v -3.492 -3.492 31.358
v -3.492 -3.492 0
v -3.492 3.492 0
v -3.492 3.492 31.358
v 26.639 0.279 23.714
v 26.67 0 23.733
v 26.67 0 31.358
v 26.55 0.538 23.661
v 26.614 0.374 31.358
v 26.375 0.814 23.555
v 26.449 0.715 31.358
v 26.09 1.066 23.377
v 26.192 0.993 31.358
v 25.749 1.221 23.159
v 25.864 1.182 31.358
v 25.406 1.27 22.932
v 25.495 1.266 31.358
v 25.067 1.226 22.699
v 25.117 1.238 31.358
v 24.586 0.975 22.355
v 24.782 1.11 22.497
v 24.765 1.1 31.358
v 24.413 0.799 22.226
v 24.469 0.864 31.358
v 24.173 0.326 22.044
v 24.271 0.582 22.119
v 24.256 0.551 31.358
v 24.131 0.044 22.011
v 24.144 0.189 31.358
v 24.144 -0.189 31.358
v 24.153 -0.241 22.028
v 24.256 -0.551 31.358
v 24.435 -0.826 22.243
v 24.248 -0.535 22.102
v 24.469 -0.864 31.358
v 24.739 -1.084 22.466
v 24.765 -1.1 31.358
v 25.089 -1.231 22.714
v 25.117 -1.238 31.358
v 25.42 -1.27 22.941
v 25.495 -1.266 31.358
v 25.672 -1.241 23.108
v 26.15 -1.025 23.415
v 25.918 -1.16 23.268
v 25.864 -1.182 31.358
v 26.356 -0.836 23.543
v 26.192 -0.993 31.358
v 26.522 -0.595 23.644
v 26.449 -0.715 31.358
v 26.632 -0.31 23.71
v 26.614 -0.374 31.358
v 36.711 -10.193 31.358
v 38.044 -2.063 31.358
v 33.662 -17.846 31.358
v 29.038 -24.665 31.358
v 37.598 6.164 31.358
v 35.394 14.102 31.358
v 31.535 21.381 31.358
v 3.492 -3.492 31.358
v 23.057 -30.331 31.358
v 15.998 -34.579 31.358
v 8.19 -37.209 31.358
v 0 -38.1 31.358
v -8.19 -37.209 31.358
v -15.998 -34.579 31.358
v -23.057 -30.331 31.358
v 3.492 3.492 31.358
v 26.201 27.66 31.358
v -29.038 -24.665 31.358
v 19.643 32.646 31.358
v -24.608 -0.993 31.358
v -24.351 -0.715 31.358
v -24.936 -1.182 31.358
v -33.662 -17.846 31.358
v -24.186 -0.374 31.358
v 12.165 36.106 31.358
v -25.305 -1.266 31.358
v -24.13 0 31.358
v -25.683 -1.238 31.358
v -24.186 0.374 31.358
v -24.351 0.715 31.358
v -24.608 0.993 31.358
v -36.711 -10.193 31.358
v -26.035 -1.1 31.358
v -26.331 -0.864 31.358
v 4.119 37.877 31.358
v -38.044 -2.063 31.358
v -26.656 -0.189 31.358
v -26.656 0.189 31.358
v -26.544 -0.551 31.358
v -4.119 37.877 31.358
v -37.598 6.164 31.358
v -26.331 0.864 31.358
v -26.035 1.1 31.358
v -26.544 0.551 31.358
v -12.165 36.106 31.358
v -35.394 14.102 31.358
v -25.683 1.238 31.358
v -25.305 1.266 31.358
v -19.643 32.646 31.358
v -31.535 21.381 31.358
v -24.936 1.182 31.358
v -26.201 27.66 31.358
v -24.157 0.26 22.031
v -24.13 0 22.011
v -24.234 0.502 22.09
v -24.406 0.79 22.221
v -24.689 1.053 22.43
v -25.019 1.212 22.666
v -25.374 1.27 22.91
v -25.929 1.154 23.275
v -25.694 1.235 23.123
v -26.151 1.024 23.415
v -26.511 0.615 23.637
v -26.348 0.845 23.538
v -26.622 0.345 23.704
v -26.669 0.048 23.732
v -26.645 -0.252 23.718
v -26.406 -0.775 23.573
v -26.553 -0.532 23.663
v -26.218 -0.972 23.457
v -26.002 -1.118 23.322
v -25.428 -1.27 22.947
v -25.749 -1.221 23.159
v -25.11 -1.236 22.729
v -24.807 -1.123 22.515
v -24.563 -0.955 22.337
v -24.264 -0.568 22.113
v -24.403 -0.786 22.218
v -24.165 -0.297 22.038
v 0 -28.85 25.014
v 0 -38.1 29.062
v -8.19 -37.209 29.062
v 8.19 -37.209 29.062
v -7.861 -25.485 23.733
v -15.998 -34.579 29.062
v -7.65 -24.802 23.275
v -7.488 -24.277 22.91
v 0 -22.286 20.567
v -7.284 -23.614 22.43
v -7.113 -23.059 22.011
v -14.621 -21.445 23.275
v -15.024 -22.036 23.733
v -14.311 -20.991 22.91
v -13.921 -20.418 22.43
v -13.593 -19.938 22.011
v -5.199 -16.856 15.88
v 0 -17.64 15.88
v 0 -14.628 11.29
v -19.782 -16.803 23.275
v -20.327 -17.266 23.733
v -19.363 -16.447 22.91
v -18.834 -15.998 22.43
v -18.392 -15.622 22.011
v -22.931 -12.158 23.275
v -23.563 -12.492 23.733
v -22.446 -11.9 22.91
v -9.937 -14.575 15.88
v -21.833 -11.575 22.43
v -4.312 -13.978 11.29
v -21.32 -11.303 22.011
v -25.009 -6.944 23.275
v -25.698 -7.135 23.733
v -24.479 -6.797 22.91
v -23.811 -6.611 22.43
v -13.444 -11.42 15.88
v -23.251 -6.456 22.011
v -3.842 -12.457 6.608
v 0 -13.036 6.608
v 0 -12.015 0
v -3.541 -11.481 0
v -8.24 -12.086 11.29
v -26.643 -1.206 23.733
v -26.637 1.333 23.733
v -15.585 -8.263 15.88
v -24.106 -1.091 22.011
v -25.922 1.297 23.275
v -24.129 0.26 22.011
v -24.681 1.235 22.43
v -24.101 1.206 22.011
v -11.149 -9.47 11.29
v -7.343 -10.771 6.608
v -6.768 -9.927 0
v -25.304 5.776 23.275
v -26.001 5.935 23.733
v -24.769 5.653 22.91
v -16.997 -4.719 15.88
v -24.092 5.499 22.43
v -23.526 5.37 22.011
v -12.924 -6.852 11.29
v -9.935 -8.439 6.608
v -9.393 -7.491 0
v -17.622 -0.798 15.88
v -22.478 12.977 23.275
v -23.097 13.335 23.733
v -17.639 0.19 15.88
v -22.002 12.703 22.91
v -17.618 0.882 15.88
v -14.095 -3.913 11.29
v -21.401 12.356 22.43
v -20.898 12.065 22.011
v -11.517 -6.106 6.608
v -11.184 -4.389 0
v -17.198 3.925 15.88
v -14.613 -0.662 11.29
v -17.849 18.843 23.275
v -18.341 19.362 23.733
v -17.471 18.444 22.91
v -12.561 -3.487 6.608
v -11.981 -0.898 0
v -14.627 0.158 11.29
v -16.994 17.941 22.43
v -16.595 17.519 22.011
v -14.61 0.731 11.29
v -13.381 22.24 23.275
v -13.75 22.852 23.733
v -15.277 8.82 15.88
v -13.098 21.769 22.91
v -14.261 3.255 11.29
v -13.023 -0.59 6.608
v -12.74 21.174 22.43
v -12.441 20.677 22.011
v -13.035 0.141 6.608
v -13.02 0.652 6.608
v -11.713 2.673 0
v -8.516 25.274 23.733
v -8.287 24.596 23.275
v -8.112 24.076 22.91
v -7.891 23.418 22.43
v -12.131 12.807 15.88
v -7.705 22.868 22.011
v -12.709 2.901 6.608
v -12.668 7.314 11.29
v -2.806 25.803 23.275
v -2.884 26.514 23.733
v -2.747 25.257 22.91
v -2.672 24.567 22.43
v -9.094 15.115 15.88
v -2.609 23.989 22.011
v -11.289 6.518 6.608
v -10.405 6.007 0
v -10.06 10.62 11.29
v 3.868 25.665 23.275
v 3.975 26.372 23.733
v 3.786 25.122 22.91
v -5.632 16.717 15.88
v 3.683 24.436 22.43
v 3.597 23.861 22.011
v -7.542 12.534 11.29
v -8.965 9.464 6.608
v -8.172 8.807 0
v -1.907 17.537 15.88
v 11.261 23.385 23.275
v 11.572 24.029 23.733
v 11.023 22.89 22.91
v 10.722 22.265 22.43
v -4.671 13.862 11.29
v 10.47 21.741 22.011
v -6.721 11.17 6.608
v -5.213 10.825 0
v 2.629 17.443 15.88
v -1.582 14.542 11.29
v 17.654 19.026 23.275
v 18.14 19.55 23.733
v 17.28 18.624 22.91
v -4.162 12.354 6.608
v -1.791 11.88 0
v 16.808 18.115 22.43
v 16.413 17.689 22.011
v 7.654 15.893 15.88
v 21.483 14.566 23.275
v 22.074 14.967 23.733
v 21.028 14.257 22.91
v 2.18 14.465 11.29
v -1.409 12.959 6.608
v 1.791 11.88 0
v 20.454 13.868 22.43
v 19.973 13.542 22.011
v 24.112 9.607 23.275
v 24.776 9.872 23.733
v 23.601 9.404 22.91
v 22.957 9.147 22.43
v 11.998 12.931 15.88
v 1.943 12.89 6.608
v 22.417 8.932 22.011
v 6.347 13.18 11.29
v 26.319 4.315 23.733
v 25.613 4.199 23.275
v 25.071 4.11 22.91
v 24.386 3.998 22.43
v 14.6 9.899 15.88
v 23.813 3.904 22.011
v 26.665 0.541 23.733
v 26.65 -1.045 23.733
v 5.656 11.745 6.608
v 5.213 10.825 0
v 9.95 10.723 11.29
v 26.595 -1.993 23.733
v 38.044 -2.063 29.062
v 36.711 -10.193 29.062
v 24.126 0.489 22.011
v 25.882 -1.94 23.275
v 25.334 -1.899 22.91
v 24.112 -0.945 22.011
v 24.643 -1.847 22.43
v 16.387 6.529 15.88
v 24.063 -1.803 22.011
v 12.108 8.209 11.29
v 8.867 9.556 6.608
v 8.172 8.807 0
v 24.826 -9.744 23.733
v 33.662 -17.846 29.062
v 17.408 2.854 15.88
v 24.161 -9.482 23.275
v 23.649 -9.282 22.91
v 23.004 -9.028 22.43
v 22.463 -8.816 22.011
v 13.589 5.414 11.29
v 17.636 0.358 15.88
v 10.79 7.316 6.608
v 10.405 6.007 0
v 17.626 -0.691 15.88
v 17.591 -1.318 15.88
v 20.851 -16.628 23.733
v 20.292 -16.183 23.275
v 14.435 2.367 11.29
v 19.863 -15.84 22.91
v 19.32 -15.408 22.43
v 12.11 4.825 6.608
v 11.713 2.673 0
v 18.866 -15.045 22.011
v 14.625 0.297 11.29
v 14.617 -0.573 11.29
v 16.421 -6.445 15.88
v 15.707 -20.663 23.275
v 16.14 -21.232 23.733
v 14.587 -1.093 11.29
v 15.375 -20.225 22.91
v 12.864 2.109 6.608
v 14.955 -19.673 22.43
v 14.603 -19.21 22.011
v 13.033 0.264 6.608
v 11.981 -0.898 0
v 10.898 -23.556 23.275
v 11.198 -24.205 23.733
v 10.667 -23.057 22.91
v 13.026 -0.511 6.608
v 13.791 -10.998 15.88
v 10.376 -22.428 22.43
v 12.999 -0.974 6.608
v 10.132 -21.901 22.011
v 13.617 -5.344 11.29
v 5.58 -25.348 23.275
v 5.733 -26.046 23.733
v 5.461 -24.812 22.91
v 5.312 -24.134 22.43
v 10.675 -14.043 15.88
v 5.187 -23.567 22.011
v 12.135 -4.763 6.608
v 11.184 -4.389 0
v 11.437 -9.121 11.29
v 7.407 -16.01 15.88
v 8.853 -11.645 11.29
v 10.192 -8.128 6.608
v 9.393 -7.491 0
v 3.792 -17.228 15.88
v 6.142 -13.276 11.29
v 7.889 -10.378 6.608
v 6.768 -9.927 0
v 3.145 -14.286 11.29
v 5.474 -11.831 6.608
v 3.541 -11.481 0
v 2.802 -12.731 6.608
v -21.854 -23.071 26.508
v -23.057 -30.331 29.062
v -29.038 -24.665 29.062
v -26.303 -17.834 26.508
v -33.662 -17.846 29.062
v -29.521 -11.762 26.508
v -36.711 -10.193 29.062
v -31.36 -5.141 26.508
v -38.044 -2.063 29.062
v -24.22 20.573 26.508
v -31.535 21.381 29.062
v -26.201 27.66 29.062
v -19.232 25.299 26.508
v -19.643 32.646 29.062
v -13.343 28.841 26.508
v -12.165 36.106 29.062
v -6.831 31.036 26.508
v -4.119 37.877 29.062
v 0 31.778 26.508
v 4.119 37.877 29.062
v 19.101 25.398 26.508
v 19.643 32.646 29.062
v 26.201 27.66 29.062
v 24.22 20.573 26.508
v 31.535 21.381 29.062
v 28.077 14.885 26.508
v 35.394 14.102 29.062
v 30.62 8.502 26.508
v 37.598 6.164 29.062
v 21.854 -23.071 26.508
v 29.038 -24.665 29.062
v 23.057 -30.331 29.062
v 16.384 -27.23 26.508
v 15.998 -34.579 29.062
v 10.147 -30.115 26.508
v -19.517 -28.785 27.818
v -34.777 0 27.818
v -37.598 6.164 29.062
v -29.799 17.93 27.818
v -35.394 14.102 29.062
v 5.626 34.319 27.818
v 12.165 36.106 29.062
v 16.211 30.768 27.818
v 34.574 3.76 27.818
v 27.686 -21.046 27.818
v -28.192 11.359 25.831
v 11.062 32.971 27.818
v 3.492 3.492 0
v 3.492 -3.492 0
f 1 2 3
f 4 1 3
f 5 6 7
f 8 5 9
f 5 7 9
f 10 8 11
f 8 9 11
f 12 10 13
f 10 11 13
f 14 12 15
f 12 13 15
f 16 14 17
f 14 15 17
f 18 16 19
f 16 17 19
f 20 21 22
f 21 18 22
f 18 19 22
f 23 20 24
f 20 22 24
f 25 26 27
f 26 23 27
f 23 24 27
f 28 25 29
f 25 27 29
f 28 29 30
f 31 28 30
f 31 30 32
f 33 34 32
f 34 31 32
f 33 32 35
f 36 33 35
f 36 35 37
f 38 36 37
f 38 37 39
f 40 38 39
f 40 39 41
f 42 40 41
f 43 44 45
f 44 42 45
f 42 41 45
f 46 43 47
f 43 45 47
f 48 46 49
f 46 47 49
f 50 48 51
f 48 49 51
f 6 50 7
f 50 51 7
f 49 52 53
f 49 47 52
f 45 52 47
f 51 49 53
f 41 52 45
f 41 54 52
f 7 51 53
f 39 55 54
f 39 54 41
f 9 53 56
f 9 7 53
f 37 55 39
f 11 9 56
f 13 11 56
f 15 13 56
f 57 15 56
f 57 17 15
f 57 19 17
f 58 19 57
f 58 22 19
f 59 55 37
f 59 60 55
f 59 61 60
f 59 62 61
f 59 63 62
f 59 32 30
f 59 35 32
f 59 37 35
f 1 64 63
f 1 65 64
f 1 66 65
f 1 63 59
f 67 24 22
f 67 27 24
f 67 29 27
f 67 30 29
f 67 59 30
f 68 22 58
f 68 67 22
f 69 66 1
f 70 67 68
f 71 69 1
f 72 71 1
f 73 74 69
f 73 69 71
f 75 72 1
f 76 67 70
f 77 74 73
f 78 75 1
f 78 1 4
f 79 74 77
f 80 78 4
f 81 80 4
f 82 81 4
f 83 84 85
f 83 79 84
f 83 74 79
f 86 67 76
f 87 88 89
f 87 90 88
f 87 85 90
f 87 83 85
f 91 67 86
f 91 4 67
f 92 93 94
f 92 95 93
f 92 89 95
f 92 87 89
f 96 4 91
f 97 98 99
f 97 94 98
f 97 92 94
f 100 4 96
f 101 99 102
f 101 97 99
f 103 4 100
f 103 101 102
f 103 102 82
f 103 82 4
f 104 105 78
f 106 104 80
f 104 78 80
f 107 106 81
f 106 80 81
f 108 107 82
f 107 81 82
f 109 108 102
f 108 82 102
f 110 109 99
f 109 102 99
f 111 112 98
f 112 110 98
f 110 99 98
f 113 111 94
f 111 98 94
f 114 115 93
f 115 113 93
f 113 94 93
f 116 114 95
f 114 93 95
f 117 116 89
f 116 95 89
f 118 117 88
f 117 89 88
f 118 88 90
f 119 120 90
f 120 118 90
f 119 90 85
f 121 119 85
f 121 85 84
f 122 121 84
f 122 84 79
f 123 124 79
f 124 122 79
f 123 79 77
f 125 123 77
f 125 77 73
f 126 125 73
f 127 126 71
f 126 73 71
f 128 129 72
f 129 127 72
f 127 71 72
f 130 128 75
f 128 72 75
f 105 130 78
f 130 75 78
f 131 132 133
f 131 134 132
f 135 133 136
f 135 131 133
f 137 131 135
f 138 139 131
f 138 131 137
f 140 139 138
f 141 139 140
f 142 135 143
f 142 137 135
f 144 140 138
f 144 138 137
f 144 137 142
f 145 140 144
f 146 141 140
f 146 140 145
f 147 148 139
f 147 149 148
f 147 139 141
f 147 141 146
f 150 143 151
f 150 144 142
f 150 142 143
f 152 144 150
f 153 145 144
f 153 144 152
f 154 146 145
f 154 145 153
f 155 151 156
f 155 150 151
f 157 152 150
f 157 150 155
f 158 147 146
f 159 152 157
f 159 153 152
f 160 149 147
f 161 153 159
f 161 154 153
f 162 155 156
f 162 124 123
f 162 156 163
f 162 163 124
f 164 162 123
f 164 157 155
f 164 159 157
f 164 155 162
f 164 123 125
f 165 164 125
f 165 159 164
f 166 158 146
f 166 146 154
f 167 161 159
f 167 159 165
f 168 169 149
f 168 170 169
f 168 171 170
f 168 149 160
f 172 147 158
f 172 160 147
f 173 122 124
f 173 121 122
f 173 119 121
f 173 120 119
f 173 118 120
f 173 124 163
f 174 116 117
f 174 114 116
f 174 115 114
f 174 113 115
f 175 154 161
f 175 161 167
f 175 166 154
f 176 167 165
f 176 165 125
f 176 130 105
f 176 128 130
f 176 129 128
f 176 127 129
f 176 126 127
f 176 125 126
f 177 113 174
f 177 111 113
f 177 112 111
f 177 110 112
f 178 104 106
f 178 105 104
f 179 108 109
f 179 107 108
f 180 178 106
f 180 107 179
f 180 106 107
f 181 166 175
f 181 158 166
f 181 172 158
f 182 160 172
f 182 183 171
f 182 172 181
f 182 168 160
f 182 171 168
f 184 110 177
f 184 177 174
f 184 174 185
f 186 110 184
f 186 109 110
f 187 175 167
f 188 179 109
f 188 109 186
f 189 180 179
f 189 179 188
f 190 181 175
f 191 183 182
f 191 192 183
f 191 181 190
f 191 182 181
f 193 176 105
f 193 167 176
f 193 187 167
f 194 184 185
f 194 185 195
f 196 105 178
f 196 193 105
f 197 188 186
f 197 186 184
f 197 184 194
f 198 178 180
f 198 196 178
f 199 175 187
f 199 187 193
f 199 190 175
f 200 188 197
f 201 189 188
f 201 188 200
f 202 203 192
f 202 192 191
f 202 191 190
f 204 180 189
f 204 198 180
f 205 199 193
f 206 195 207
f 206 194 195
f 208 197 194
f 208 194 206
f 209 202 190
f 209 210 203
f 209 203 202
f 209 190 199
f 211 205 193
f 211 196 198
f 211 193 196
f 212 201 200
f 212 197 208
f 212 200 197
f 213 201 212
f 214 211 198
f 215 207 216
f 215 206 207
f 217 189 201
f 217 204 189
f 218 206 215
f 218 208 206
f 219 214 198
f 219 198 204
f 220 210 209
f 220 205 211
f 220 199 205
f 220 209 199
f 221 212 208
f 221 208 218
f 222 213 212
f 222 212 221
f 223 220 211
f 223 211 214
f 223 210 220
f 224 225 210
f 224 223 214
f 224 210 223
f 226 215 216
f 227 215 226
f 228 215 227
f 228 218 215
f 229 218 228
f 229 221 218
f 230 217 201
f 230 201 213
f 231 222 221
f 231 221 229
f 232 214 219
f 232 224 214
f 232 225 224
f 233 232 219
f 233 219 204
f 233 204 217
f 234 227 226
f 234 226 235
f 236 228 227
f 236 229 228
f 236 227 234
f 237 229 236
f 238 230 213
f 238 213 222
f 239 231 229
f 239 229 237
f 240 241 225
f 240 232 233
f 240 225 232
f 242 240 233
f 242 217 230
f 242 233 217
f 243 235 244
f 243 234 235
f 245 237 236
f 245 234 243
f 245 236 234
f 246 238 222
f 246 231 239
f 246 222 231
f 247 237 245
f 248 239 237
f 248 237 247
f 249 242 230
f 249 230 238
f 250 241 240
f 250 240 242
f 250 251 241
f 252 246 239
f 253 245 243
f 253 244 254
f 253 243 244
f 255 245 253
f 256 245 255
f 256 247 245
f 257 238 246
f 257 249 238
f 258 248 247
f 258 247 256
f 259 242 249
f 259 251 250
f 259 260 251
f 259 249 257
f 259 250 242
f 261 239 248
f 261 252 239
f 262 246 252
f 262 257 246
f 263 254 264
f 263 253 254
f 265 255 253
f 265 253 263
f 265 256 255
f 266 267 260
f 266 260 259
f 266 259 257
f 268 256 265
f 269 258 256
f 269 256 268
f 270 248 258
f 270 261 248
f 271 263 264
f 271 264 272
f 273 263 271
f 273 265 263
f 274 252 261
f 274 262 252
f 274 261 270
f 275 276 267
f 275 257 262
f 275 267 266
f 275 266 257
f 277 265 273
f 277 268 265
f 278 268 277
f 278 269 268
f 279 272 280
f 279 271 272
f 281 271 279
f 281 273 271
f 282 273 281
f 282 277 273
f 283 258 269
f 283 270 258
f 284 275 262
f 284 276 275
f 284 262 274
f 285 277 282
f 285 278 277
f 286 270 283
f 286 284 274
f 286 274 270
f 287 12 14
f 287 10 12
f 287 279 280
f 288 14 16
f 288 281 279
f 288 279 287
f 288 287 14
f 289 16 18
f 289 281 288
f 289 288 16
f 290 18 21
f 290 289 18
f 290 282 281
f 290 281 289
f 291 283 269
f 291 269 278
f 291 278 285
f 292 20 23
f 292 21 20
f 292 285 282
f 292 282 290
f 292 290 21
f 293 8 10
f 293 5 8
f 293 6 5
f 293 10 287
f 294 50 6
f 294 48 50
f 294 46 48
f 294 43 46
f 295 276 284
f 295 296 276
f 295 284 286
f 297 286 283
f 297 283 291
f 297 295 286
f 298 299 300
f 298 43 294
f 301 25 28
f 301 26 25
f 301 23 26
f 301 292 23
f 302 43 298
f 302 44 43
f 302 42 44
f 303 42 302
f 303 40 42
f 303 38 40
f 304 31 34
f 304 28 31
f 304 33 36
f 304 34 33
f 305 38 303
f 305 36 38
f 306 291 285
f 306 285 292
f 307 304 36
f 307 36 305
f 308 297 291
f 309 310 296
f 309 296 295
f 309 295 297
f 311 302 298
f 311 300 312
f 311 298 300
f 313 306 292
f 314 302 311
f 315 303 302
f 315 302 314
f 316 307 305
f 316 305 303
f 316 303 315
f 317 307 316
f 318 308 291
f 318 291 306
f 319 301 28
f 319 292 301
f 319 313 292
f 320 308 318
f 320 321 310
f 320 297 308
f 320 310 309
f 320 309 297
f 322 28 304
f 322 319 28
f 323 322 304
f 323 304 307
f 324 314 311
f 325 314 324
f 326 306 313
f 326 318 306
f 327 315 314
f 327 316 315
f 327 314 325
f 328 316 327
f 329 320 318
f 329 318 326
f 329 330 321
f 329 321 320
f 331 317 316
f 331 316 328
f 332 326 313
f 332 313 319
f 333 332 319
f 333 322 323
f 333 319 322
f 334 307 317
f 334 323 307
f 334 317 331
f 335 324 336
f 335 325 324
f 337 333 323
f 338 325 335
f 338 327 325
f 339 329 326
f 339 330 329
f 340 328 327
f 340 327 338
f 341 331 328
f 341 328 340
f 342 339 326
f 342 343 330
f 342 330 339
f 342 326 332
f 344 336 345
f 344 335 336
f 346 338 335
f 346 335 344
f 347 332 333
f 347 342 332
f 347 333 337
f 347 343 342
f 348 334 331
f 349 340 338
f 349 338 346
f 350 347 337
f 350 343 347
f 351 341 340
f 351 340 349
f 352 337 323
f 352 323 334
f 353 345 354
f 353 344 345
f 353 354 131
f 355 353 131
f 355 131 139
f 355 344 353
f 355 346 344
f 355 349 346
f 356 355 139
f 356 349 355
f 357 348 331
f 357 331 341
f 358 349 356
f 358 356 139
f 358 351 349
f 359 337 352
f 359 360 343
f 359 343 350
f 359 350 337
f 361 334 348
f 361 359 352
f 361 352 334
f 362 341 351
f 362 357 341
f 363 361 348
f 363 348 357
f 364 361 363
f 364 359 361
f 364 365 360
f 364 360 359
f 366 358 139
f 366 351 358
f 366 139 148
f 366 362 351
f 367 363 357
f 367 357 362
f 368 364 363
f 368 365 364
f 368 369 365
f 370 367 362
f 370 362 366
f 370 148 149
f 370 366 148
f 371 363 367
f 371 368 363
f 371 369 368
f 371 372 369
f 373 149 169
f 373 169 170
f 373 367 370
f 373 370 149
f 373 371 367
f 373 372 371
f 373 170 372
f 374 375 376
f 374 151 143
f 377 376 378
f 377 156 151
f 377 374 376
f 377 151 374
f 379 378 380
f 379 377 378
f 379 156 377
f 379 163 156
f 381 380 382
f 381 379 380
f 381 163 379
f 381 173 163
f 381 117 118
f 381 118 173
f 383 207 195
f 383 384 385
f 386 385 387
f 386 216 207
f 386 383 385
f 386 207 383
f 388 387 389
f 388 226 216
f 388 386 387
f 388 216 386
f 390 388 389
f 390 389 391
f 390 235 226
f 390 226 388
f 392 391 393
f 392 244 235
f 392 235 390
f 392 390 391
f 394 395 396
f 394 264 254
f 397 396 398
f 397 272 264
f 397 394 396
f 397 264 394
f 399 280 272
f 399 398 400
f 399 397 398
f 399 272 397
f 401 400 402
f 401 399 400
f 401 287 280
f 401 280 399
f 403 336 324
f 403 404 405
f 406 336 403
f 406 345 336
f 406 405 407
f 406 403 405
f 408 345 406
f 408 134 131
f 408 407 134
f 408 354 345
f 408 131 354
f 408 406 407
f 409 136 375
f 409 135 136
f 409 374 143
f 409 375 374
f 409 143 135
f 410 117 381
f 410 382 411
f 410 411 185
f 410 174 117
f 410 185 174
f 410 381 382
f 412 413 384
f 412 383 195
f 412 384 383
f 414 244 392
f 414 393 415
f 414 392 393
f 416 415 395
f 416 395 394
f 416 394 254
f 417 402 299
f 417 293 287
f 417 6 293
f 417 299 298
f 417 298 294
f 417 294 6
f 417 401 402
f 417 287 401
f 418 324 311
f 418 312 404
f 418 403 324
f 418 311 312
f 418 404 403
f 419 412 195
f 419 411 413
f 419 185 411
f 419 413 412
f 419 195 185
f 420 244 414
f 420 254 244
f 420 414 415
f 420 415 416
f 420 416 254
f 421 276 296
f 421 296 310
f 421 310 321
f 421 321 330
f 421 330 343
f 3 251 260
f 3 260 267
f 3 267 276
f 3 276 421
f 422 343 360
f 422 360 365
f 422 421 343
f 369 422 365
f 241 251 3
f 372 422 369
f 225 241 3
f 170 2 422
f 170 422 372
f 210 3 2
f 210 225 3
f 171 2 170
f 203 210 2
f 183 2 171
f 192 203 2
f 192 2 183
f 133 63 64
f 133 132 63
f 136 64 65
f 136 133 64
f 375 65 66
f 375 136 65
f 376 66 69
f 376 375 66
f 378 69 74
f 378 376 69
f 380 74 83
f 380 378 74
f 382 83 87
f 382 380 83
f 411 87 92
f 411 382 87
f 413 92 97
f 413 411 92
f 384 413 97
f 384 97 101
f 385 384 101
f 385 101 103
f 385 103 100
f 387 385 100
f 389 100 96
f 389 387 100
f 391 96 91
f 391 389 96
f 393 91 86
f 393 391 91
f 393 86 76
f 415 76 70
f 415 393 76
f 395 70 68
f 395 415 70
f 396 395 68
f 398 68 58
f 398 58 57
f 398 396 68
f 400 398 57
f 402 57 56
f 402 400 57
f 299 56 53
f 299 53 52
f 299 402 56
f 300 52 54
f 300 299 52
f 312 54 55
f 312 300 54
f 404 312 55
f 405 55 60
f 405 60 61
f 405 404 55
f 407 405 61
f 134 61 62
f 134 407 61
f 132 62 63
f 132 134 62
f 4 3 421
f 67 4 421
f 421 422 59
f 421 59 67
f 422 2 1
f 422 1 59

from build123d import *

# Parameters (mm, degrees)
F2_W     = 6.985
F2_H     = 6.985
F3_DEPTH = 31.3591392294
F4_R     = 1.27
F5_DEPTH = 31.3591393294


with BuildPart() as f1:
    # F0 (on Right) → F1 (revolve)
    with BuildSketch(Plane.YZ):
        with BuildLine():
            Line((0, 0), (0, 31.3581392294))
            Line((0, 31.3581392294), (-38.1, 31.3581392294))
            Line((-38.1, 31.3581392294), (-38.1, 29.0615208854))
            add(Edge.make_bspline(
                [(-38.1, 29.0615208854), (-26.7971571911, 25.1598302044), (-15.8579765578, 15.5865226046), (-12.8539522067, 8.1840861578), (-12.014542318, 0)],
                knots=[0.1026687543, 0.1026687543, 0.1026687543, 0.1026687543, 0.586312354, 1, 1, 1, 1], degree=3))
            Line((-12.014542318, 0), (0, 0))
        make_face()
    revolve(axis=Axis((0, 0, 15.6790696147), (0, 0, -1)))

    # F2 (on Top) → F3 (cut, through all)
    with BuildSketch(Plane.XY):
        Rectangle(F2_W, F2_H)
    extrude(amount=F3_DEPTH, mode=Mode.SUBTRACT)

    # F4 (on face) → F5 (cut, through all)
    with BuildSketch(Plane.XY.offset(31.3581392294)):
        with Locations((-25.4, 0)):
            Circle(F4_R)
        with Locations((25.4, 0)):
            Circle(F4_R)
    extrude(amount=-F5_DEPTH, mode=Mode.SUBTRACT)


solid = f1.part
